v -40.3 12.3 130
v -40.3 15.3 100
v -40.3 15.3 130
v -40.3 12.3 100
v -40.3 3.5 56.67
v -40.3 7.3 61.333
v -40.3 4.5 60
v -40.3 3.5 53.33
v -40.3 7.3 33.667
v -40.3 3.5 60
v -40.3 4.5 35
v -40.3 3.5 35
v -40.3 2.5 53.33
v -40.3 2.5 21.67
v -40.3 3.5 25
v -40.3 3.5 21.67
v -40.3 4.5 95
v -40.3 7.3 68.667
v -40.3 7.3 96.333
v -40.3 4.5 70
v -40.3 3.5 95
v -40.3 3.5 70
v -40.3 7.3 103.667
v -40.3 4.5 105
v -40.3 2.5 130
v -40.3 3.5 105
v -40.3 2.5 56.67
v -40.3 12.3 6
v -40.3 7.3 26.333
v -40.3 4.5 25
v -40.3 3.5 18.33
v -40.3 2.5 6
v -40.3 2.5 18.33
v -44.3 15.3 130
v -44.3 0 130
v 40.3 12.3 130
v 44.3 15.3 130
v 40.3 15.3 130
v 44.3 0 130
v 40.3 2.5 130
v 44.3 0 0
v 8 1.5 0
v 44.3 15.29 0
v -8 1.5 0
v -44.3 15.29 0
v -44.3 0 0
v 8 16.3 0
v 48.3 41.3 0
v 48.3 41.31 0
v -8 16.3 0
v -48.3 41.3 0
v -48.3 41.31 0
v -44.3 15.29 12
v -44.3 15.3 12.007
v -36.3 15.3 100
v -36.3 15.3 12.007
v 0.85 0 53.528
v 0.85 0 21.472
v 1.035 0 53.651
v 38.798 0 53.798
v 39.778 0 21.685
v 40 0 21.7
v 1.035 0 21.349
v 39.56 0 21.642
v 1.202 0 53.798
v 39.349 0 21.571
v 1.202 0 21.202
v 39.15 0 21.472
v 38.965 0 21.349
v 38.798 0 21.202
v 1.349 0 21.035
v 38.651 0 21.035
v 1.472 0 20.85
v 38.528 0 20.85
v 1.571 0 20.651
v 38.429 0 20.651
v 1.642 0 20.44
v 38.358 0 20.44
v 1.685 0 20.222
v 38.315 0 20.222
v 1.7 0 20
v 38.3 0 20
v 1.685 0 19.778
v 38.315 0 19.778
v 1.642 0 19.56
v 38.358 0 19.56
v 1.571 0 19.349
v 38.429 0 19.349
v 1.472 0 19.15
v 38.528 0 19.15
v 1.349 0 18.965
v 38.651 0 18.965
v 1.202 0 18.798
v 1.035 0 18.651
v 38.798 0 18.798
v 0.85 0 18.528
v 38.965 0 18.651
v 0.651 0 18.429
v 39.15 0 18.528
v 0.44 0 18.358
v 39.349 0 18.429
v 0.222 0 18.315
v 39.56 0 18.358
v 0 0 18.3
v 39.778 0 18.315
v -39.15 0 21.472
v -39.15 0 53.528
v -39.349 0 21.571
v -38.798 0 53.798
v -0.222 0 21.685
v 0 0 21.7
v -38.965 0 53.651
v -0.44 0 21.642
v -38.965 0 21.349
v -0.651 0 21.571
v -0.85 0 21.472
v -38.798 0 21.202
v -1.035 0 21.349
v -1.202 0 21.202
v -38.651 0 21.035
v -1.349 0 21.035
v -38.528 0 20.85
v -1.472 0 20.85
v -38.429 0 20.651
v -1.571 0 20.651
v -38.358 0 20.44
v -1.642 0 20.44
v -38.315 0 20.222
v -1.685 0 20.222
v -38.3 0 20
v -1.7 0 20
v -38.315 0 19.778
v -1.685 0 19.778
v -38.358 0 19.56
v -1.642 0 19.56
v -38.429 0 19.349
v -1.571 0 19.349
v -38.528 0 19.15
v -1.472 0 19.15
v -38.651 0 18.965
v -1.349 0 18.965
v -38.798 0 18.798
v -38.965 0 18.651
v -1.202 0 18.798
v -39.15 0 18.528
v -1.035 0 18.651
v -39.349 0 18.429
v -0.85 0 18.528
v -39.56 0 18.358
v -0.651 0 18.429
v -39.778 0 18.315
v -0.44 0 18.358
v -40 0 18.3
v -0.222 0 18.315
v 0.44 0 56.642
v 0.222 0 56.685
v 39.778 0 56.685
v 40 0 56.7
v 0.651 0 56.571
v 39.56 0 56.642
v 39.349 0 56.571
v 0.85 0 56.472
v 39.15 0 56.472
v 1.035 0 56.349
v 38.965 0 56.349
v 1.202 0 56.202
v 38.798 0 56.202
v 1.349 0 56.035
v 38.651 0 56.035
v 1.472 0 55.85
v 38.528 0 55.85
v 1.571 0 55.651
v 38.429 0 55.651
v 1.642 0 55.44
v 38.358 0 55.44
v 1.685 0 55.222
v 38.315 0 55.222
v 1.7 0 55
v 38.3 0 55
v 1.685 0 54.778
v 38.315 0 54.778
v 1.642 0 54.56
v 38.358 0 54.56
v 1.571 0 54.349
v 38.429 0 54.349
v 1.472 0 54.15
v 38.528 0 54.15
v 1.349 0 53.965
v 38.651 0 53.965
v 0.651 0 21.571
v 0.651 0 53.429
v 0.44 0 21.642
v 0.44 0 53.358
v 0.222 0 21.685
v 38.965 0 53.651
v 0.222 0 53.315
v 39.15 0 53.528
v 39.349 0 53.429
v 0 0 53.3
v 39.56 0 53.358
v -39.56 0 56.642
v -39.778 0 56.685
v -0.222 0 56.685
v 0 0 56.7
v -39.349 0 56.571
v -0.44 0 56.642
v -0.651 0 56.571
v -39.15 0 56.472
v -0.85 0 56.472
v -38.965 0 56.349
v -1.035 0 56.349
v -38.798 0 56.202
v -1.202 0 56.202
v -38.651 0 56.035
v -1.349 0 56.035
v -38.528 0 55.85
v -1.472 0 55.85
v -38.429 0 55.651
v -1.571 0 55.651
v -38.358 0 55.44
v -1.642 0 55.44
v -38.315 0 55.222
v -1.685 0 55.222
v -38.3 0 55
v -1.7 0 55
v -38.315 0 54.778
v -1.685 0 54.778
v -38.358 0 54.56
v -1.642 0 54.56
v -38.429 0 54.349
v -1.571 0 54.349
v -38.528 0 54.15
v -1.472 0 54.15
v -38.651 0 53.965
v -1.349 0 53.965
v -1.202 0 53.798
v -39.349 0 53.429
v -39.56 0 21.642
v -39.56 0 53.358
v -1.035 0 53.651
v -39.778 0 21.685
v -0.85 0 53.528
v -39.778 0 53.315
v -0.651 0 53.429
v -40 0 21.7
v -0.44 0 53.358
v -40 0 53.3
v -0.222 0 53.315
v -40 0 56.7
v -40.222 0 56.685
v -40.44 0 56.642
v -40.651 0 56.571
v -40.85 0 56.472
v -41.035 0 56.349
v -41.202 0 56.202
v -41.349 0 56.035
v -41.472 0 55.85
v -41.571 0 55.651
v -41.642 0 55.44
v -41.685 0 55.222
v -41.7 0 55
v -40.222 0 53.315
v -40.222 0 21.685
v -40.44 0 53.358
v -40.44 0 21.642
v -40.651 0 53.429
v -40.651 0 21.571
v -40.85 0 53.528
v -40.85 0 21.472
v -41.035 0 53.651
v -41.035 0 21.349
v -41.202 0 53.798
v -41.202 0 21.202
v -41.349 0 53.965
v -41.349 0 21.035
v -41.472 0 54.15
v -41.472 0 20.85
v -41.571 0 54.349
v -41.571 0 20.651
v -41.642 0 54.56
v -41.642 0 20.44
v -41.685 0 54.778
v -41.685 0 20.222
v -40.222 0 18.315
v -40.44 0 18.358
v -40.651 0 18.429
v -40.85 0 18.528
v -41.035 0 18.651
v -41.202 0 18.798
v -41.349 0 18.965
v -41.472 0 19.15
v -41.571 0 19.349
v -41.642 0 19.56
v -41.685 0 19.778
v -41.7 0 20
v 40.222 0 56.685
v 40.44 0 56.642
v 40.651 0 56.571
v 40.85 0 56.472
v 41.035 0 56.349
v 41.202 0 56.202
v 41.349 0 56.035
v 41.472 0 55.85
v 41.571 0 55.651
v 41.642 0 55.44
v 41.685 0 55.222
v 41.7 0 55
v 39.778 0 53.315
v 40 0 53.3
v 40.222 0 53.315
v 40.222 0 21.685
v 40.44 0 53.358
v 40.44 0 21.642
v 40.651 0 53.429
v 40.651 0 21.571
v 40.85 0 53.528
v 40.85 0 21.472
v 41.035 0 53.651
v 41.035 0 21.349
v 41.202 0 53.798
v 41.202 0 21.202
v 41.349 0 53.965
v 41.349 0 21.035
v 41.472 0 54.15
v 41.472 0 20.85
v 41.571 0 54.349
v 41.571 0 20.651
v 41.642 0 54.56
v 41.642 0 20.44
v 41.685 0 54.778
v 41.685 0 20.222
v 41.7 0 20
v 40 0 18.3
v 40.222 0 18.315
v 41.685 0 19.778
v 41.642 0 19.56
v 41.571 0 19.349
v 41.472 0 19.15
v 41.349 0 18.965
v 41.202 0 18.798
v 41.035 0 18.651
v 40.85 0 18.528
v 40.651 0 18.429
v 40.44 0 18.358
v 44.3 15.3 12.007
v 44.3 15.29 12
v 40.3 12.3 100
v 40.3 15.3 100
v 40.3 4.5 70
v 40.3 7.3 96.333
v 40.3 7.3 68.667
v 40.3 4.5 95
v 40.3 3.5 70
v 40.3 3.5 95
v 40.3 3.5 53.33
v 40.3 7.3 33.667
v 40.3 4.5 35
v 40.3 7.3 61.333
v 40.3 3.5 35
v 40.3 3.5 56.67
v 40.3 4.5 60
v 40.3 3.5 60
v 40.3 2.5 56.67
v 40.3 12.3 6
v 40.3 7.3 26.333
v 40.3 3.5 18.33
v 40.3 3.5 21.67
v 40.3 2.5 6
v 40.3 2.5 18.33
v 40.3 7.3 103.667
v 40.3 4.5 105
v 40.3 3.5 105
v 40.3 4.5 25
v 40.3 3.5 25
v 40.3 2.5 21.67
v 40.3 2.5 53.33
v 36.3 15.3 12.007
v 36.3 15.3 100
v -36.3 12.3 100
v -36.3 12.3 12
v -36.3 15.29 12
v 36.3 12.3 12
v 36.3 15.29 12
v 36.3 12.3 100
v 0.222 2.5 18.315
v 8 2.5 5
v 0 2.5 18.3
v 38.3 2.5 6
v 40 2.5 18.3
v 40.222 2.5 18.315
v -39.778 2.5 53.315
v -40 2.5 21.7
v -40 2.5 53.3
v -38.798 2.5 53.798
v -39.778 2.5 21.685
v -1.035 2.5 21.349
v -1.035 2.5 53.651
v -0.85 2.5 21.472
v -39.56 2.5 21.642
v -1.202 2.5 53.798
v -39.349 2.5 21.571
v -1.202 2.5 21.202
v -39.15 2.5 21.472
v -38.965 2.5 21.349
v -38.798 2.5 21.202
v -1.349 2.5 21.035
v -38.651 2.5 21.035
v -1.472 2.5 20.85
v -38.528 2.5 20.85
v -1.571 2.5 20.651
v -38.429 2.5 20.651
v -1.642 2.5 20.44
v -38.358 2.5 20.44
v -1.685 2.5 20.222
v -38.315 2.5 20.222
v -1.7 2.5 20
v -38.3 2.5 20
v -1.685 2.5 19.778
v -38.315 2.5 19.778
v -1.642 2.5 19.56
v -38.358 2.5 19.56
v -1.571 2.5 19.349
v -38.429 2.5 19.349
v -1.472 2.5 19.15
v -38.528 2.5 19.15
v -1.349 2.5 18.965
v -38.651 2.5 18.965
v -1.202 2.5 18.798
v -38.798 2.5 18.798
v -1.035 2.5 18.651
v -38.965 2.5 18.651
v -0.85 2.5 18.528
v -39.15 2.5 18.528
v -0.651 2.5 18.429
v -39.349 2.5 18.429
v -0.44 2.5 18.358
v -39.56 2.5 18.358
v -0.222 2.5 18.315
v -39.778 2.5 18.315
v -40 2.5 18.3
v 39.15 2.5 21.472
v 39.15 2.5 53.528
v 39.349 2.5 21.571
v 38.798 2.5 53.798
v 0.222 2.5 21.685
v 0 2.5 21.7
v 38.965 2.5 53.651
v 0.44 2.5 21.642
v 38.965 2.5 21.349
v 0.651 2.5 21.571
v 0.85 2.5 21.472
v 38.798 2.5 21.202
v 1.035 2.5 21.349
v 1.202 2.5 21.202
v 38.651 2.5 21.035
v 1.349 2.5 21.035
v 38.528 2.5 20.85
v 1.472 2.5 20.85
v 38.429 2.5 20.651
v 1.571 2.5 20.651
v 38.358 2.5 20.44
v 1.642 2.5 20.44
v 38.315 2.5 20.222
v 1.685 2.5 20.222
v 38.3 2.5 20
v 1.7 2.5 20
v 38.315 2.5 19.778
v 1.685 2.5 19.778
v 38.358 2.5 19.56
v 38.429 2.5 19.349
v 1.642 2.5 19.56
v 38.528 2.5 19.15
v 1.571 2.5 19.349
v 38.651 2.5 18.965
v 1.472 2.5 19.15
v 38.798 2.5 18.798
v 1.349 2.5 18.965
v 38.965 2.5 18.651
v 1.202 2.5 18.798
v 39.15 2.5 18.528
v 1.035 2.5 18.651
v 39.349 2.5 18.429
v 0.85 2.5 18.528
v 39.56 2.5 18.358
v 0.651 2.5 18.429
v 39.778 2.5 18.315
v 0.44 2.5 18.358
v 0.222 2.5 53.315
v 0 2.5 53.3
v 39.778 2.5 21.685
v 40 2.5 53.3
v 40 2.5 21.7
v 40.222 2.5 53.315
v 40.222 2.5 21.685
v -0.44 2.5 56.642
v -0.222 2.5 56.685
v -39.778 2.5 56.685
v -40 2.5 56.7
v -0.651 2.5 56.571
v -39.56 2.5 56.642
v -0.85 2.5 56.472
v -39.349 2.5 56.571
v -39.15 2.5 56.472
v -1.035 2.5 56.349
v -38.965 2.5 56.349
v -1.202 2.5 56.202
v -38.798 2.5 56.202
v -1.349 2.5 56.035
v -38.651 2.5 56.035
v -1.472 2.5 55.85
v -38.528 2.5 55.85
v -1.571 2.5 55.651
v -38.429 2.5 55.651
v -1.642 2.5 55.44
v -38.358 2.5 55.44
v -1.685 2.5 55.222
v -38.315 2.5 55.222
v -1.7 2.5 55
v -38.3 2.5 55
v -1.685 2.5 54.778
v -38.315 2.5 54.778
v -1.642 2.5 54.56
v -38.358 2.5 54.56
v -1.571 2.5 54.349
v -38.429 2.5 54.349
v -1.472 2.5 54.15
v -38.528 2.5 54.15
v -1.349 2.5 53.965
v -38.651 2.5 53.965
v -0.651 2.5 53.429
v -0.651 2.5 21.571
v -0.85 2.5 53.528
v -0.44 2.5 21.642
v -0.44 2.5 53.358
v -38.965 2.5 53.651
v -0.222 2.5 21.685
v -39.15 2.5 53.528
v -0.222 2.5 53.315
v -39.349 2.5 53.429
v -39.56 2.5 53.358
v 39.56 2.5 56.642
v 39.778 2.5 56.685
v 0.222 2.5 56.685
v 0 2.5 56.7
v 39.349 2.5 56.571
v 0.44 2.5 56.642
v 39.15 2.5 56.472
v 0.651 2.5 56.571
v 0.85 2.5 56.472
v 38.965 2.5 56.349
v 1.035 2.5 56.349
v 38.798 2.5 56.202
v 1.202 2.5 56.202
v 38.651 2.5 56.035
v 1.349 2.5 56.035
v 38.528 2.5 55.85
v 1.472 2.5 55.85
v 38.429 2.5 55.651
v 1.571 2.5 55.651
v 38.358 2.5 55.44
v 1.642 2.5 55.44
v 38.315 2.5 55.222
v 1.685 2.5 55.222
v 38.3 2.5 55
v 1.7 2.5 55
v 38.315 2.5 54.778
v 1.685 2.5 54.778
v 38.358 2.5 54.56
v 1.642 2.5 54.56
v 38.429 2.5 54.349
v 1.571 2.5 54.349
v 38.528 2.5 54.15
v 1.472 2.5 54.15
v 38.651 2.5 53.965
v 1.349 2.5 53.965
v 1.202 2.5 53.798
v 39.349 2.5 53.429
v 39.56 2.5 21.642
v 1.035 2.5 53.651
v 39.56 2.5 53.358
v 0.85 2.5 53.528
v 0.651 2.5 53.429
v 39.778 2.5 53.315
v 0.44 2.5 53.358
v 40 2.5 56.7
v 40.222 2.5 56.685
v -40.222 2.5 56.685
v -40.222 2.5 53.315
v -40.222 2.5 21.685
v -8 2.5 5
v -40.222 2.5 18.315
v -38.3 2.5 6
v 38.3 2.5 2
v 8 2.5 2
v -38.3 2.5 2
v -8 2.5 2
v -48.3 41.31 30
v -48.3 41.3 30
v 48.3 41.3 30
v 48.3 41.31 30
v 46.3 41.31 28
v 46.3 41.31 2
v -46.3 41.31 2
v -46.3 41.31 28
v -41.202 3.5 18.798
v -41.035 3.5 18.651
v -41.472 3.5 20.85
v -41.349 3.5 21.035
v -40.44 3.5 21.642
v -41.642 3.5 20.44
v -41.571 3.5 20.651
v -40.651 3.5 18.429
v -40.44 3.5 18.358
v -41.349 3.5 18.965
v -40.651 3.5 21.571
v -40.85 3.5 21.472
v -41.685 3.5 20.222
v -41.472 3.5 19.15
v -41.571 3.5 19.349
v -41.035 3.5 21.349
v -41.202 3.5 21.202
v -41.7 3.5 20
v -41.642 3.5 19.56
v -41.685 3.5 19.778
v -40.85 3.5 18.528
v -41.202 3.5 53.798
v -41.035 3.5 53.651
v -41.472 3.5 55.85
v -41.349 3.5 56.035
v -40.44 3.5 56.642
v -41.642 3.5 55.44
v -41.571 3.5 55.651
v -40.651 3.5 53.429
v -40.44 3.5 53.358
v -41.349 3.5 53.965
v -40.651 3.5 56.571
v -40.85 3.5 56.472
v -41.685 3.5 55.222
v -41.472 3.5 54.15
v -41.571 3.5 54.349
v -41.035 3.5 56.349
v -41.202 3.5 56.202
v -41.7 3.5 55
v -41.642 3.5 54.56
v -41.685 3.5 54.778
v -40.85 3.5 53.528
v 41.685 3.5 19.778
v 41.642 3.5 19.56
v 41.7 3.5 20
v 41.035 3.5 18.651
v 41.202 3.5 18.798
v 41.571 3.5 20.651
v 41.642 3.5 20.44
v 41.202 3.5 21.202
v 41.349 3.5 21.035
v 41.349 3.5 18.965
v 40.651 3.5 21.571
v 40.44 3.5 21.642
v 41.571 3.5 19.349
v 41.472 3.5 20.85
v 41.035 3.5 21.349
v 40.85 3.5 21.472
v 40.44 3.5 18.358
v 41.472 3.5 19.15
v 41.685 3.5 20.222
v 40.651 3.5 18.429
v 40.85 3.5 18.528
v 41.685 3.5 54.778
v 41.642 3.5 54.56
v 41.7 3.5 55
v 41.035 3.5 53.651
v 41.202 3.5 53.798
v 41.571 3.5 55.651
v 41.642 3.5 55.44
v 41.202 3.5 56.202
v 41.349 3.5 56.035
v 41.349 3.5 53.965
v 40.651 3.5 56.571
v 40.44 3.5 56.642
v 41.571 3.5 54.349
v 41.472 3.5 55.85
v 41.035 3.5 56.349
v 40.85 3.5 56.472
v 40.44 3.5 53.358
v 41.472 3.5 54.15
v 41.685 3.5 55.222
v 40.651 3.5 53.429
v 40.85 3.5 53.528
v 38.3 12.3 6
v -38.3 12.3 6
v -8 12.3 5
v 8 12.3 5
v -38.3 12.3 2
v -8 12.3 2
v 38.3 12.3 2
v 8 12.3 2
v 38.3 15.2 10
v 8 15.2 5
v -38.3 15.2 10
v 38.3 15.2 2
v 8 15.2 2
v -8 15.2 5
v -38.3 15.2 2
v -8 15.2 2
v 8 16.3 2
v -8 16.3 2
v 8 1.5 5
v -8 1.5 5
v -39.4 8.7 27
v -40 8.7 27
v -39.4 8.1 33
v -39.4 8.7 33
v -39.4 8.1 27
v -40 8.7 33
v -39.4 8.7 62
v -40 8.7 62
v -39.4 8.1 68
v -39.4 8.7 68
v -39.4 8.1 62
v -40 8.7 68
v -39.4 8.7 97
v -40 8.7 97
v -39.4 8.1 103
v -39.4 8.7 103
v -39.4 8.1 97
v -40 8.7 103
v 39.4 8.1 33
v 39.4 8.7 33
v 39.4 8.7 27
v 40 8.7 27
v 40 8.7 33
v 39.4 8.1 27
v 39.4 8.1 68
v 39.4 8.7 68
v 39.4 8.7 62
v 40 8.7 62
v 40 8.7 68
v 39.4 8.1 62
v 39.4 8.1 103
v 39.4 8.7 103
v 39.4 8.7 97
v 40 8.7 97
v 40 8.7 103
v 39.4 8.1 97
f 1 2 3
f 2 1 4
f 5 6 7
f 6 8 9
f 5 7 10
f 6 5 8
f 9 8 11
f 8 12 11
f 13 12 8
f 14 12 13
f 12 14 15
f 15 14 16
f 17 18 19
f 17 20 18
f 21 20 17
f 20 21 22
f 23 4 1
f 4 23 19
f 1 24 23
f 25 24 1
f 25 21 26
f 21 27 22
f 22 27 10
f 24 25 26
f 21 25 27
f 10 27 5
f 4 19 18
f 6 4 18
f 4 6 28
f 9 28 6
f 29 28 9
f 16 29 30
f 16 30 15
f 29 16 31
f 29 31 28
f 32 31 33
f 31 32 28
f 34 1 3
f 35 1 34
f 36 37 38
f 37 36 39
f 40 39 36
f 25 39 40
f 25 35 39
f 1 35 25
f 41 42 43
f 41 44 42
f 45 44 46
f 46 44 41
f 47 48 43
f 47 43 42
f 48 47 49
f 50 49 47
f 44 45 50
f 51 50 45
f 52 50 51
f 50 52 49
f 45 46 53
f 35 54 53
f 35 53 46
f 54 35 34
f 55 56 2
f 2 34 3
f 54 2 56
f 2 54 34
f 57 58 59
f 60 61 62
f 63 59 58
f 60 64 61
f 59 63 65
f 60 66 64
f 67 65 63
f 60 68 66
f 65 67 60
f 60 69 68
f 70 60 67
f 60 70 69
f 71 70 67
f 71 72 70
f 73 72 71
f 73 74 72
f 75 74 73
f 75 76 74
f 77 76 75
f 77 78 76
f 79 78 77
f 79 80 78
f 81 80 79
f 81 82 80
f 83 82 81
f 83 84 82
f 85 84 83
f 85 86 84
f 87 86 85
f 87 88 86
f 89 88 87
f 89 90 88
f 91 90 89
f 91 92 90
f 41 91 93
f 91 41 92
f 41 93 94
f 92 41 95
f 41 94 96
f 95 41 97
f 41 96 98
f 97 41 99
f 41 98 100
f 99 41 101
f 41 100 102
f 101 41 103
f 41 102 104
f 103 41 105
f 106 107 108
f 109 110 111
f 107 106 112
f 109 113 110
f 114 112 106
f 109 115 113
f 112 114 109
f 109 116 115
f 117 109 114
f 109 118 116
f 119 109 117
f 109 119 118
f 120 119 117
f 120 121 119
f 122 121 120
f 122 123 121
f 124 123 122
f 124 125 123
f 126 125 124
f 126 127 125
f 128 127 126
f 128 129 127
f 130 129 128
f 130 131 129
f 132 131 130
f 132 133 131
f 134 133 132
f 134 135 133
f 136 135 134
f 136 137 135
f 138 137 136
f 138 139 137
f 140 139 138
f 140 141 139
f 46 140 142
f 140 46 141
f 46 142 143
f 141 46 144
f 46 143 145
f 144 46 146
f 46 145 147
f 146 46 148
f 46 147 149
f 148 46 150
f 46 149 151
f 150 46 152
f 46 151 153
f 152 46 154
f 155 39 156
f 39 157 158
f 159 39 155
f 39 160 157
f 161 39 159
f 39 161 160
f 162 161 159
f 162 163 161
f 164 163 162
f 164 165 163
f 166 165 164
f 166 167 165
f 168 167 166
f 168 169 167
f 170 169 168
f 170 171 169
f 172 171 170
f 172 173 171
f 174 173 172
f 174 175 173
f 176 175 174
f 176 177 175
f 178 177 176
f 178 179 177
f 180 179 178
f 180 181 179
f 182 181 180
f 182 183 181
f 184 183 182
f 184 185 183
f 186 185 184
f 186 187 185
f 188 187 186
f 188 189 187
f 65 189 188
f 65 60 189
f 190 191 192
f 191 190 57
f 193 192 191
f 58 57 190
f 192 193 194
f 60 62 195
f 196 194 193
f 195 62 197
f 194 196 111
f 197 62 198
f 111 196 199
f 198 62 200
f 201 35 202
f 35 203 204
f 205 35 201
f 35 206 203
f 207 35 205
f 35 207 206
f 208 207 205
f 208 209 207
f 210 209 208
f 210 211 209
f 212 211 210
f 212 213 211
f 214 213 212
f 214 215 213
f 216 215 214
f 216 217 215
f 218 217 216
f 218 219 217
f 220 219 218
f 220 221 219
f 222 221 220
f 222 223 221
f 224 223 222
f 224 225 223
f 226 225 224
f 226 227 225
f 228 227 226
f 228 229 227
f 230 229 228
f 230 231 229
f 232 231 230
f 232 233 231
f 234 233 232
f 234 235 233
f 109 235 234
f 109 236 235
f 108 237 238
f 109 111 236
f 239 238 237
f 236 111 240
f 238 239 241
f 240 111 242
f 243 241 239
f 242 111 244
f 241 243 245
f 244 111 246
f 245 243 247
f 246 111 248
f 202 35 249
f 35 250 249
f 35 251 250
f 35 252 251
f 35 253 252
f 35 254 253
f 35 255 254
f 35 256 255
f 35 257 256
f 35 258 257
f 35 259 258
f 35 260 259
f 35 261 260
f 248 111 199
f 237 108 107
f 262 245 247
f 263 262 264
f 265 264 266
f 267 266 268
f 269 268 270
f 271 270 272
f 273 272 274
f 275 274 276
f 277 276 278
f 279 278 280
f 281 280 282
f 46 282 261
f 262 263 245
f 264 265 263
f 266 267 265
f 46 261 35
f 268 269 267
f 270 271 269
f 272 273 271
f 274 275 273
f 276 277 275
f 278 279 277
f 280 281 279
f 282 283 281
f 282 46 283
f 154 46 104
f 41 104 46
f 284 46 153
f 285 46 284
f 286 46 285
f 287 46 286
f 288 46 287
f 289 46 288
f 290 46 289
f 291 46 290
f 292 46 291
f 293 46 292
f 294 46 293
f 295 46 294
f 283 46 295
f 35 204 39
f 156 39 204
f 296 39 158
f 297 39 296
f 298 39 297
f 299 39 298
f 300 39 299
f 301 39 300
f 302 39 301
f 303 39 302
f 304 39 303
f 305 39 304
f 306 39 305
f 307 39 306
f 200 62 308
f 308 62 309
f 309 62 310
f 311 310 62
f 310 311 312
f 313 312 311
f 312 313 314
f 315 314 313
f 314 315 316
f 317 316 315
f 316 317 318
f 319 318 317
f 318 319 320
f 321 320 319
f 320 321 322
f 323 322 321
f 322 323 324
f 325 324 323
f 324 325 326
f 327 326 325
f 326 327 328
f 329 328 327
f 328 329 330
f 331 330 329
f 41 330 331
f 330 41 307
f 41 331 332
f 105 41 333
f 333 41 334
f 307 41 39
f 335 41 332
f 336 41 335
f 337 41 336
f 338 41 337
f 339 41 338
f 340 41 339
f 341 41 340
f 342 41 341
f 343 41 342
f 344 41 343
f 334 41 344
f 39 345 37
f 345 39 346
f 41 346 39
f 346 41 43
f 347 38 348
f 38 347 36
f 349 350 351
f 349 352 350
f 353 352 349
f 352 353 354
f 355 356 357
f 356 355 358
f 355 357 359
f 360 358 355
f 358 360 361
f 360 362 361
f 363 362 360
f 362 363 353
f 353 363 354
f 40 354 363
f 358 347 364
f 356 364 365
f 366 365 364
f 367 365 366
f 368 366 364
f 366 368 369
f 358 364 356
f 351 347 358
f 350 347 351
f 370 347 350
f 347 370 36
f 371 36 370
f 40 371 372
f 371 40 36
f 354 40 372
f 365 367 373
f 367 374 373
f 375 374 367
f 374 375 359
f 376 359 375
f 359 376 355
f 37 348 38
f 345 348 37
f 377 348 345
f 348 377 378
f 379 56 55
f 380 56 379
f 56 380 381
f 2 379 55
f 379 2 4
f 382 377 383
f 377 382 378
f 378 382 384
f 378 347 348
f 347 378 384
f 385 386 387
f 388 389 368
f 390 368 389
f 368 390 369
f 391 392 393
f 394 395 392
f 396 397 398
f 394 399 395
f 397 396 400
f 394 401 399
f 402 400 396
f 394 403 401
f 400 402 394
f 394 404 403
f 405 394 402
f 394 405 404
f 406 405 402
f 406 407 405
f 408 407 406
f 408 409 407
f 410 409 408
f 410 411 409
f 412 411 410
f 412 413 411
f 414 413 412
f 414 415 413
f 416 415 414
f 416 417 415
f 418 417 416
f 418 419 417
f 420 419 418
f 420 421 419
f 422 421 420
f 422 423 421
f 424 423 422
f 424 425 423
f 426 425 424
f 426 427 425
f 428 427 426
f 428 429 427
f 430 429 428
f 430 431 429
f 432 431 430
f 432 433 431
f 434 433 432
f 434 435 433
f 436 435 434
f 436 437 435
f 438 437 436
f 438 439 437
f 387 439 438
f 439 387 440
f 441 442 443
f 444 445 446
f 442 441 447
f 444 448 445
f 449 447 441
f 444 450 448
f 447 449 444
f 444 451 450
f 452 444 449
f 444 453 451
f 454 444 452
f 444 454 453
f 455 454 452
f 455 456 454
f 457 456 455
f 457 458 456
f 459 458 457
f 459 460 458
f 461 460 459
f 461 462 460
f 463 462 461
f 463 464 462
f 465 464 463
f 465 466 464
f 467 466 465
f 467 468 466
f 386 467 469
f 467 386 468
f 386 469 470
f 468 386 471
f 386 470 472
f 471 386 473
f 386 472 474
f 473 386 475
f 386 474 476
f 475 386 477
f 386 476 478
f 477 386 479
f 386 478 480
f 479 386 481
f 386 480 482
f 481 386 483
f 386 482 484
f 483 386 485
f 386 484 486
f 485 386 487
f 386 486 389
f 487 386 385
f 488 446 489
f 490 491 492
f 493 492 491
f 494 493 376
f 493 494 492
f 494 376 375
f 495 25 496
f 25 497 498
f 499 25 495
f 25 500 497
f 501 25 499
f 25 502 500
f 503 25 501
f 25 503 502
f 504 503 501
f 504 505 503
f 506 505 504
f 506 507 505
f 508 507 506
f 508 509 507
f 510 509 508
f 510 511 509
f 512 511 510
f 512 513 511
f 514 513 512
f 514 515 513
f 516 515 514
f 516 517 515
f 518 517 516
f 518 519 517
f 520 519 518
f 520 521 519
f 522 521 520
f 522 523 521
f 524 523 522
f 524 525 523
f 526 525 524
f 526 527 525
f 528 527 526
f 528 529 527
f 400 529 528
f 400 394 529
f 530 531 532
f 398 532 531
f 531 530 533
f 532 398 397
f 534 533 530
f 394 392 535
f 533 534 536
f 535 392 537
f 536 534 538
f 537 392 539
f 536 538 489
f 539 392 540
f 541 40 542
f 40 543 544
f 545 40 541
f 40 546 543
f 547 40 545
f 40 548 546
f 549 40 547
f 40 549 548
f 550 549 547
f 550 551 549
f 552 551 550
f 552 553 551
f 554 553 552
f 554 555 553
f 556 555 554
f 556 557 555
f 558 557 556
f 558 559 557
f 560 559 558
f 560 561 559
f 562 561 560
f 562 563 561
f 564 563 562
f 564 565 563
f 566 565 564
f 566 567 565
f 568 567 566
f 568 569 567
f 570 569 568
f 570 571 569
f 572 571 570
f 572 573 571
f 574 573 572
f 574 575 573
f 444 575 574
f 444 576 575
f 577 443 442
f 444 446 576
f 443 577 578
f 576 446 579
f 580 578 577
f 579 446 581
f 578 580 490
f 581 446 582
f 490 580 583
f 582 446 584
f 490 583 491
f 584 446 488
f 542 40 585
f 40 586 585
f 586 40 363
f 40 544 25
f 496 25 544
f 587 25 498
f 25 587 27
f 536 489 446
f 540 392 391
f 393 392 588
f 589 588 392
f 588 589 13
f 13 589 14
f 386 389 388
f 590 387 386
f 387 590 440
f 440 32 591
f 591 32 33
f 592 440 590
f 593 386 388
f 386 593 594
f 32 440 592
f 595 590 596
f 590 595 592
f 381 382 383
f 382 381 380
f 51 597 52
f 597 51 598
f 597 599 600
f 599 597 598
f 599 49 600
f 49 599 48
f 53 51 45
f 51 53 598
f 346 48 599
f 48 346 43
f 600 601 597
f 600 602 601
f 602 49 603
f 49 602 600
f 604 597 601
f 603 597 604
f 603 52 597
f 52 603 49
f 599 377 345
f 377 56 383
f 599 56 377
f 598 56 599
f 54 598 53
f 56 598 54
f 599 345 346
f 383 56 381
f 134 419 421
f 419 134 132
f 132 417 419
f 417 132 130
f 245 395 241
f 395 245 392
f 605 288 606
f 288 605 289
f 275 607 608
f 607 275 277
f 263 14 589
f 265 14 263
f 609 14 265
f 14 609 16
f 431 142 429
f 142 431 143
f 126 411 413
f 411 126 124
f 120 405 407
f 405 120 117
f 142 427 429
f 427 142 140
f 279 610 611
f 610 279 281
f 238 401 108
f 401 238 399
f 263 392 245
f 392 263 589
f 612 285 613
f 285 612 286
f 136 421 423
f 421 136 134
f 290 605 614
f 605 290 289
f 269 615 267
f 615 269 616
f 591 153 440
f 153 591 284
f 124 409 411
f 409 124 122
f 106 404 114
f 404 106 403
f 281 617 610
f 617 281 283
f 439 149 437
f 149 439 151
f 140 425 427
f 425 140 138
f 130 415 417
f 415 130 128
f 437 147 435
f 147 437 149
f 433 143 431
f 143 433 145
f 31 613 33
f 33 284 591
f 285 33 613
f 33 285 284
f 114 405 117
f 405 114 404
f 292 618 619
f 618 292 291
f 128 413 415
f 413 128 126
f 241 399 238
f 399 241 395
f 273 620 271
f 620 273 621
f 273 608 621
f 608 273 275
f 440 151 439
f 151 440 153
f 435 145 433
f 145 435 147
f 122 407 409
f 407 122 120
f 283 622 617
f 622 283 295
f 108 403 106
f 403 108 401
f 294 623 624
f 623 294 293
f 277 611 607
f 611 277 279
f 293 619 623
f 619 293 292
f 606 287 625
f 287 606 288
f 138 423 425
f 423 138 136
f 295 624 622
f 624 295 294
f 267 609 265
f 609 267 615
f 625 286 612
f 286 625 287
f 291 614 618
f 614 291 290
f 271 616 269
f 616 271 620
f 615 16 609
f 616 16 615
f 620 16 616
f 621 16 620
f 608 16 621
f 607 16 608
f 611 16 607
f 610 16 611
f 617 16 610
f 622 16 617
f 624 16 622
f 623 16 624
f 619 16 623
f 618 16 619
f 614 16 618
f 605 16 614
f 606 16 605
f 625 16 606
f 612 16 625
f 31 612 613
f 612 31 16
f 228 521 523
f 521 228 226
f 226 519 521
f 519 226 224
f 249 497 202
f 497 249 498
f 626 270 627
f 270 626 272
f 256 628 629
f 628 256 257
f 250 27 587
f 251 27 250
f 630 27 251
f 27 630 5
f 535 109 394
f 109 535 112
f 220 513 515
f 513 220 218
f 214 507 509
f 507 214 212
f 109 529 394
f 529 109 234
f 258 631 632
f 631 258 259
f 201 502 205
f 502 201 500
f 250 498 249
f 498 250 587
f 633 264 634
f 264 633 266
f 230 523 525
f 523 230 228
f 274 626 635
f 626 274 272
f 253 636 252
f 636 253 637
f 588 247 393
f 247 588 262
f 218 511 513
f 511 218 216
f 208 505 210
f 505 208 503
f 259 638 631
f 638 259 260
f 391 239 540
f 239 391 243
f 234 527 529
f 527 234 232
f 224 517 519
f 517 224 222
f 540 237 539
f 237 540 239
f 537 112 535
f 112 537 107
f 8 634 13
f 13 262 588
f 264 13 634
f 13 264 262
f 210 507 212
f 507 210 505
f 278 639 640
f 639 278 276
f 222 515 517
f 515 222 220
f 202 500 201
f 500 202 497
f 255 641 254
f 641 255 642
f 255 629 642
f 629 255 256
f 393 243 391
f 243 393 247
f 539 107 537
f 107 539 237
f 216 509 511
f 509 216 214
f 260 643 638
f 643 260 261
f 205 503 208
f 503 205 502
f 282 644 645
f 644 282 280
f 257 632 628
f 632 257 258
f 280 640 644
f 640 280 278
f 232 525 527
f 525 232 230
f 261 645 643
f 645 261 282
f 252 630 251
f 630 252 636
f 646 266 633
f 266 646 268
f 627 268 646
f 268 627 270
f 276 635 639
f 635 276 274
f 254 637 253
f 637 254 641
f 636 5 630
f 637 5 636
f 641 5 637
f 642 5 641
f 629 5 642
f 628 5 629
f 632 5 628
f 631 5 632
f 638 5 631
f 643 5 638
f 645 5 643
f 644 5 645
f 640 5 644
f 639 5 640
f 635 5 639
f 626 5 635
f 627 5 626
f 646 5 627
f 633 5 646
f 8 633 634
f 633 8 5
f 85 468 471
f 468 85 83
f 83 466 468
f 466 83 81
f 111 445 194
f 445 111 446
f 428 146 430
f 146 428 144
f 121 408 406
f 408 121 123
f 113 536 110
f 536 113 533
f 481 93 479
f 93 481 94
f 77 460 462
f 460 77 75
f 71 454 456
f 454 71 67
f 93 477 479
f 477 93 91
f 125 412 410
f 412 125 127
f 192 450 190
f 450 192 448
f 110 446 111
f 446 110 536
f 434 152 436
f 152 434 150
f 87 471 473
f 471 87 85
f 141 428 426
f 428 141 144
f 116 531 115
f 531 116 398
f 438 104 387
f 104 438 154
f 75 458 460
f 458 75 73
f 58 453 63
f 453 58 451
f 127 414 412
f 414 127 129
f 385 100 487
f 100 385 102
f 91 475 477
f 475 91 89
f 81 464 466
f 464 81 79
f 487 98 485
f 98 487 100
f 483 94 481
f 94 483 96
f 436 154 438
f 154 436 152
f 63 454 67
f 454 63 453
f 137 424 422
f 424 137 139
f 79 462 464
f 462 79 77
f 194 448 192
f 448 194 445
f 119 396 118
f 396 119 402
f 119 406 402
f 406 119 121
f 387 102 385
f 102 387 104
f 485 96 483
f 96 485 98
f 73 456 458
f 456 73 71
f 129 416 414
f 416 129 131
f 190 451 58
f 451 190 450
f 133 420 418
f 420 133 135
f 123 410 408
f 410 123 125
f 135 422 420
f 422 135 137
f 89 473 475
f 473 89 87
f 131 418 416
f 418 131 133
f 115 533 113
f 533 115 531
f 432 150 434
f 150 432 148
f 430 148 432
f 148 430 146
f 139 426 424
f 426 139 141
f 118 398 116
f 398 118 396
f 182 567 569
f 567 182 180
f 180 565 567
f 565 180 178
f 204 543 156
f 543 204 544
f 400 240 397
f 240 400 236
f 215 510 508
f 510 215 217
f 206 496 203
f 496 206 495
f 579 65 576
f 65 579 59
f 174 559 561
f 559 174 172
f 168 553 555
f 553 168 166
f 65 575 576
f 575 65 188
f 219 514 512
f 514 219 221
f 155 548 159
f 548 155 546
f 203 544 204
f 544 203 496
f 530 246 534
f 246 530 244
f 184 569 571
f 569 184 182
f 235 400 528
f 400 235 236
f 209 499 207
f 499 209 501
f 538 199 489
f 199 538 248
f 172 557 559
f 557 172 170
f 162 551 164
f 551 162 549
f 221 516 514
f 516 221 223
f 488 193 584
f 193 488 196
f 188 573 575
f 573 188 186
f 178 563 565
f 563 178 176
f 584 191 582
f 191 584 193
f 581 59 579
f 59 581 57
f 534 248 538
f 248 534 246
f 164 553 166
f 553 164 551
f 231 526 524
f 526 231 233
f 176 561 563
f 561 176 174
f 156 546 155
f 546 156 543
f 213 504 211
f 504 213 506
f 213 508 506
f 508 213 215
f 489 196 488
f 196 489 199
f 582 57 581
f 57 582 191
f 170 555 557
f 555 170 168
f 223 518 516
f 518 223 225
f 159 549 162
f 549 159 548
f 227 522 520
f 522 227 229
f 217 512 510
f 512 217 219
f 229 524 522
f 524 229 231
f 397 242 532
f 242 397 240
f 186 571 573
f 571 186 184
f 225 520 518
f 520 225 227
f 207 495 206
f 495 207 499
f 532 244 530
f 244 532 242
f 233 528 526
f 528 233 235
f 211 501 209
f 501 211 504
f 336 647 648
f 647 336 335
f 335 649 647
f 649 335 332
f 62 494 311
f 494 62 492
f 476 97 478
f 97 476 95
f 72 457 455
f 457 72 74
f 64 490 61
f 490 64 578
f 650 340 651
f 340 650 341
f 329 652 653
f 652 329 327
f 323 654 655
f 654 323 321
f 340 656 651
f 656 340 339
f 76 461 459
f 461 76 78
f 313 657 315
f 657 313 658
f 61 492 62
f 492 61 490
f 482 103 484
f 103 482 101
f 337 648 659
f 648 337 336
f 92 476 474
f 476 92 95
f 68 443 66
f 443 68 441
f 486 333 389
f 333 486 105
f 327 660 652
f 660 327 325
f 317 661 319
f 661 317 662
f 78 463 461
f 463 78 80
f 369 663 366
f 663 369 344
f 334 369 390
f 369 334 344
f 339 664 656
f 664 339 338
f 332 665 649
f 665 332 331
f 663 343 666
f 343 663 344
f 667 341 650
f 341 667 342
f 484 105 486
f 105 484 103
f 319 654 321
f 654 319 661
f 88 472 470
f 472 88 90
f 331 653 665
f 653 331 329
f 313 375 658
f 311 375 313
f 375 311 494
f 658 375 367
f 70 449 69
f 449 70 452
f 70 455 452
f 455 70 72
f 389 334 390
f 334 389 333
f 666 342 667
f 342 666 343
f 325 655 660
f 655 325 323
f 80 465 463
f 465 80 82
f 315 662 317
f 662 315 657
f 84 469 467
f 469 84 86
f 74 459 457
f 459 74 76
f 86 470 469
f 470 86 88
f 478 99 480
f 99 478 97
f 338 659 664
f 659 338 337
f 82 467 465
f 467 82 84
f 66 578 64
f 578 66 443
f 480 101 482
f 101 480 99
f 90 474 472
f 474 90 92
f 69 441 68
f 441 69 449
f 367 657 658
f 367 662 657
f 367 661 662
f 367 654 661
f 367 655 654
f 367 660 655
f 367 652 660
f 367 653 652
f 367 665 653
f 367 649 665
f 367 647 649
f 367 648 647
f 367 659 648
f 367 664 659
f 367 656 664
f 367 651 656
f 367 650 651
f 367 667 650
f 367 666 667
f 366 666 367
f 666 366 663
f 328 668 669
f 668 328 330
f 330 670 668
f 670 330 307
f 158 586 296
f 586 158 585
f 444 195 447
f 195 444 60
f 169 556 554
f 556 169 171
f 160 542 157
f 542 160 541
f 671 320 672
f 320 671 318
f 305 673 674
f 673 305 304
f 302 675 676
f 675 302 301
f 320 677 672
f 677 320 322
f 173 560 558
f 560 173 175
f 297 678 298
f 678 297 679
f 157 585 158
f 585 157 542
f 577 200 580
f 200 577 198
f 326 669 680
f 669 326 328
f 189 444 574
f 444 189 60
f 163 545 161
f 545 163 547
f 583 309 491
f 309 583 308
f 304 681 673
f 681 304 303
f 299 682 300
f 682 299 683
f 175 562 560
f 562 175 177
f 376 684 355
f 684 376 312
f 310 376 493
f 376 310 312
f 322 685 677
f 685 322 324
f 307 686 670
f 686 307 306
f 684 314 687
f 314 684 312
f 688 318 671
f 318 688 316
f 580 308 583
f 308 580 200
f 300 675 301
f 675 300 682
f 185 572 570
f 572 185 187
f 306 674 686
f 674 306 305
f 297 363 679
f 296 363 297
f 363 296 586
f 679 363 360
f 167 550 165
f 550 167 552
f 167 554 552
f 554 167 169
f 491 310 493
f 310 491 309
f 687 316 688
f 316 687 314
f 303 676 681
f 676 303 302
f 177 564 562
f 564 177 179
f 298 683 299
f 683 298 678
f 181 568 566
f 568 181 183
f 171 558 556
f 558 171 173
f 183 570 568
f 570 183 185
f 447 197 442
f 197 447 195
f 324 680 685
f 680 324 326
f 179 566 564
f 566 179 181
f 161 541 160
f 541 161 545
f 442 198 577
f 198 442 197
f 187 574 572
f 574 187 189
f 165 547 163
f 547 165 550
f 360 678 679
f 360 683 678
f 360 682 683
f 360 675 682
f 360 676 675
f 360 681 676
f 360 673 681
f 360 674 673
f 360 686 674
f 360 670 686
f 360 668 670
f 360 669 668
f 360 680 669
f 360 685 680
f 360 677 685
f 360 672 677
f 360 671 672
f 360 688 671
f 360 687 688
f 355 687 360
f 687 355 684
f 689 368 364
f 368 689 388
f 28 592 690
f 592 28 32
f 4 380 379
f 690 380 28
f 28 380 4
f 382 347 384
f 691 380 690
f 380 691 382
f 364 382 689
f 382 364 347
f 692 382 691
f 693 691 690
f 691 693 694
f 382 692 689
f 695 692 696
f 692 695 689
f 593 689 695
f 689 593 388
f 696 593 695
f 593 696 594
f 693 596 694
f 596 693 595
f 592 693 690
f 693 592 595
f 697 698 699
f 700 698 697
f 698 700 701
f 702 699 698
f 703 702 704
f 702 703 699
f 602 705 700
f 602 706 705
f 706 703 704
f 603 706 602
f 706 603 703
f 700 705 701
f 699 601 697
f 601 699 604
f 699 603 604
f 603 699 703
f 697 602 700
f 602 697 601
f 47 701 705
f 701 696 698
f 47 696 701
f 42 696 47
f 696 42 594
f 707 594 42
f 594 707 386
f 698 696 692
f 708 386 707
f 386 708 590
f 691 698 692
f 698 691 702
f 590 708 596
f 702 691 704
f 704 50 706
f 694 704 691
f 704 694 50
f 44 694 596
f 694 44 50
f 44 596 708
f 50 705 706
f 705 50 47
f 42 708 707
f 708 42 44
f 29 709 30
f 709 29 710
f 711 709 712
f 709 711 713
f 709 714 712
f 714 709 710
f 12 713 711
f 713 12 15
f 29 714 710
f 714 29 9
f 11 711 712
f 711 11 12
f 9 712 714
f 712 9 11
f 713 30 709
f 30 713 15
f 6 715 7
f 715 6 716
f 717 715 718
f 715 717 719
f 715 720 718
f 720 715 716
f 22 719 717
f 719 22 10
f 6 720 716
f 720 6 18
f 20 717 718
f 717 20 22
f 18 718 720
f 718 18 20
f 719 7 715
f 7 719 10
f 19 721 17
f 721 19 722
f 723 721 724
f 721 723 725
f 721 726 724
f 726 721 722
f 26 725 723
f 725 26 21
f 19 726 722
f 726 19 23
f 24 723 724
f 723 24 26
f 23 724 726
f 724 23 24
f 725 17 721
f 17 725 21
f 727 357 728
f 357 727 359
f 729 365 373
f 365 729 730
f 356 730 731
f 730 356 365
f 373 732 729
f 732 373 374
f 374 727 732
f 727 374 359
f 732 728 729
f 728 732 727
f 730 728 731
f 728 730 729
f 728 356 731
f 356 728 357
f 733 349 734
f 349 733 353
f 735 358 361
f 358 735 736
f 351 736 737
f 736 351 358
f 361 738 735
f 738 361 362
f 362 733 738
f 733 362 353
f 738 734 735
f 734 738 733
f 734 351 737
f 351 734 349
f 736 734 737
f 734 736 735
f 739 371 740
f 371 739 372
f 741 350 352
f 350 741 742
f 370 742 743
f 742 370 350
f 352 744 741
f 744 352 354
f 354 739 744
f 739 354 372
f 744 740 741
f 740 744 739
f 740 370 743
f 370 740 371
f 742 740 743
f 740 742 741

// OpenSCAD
// file: params.scad
// Lanterna do Olho — parâmetros comuns (mm)
L = 150;      // comprimento externo (x)
W = 100;      // largura externa (y)
H = 80;       // altura externa (z)
wall = 2.0;   // parede
floor_t = 2.4;
rc = 5;       // raio dos cantos
dowel_d = 20.6;   // furo do cabo (dowel de 20 mm + folga). Cabo de vassoura: mede e troca.
socket_h = 35;    // altura do soquete do cabo dentro da caixa
lid_lip = 1.6;    // aba interna da tampa
lid_t = 3;
$fn = 64;
module rbox(l, w, h, r) { hull() for (x=[-1,1], y=[-1,1]) translate([x*(l/2-r), y*(w/2-r), 0]) cylinder(r=r, h=h); }
// main file
include <params.scad>
// BERÇO DO CELULAR v2 — com abas flexíveis e corneta acústica. (Segurança extra: um elástico em volta da caixa inteira.)
// Parafusa nos 6 furos da frente da caixa. Celular entra por cima; a borda de baixo entra na bolsa acústica.
// Imprime DEITADO: chapa de trás no prato (como o STL sai). Sem suporte.
ph_w = 80;   // largura do celular com case (mm)  <-- AJUSTE
ph_t = 9;    // espessura com case (mm)           <-- AJUSTE
rail_h = 130;        // altura dos trilhos (celular tem ~170; o topo fica livre)
lip = 4;             // aba frontal que segura a borda
lip_top = 100;       // abas só até essa altura (nada cobre a câmera lá em cima)
back_t = 2.5;        // chapa de trás
slot_w = ph_w + 0.6; // folga lateral
slot_t = ph_t + 0.8; // folga de espessura
rail = 4;            // espessura do trilho lateral
horn_depth = 26; horn_h_in = 12; horn_h_out = 30; pocket_h = 12;
y_front = back_t + slot_t;  // plano da frente do celular
$fn = 48;
module body() {
  // chapa de trás
  translate([-(slot_w+2*rail)/2, 0, 0]) cube([slot_w+2*rail, back_t, rail_h]);
  // trilhos laterais
  for (s=[-1,1]) translate([s*(slot_w/2+rail/2) - rail/2, 0, 0]) cube([rail, y_front+3, rail_h]);
  // abas frontais (com chanfro a 45° por baixo pra imprimir deitado)
  for (s=[-1,1]) hull() {
    translate([s>0 ? slot_w/2-lip : -slot_w/2, y_front, 0]) cube([lip, 3, lip_top]);
    translate([s>0 ? slot_w/2 : -slot_w/2-0.01, y_front-lip, 0]) cube([0.01, lip+3, lip_top]);
  }
  // bolsa acústica: caixa fechada em volta da borda de baixo do celular
  translate([-(slot_w+2*rail)/2, 0, 0]) cube([slot_w+2*rail, y_front+3, pocket_h]);
  // corneta: se abre pra frente (+y) a partir da bolsa
  hull() {
    translate([-(slot_w+2*rail)/2, y_front+3-0.01, 0]) cube([slot_w+2*rail, 0.01, horn_h_in]);
    translate([-(slot_w+2*rail)/2-4, y_front+3+horn_depth, 0]) cube([slot_w+2*rail+8, 0.01, horn_h_out]);
  }
}
module cavities() {
  // vão do celular
  translate([-slot_w/2, back_t, pocket_h-6]) cube([slot_w, slot_t, rail_h+10]);
  // câmara acústica dentro da bolsa (espaço embaixo do celular, 5 mm) e saída pra corneta
  translate([-slot_w/2+2, back_t, 2]) cube([slot_w-4, slot_t, pocket_h]);
  hull() {
    translate([-slot_w/2+2, y_front+2.9, 2]) cube([slot_w-4, 0.01, horn_h_in-4]);
    translate([-(slot_w+2*rail)/2-4+2, y_front+3+horn_depth+0.01, 2]) cube([slot_w+2*rail+8-4, 0.01, horn_h_out-4]);
  }
  // furos M3 (grade da caixa: x = -40,0,40 ; z = 20,55)
  for (x=[-40,0,40], z=[20,55]) translate([x, -1, z]) rotate([-90,0,0]) cylinder(d=3.4, h=back_t+2);
  // abertura na frente da bolsa pra porta USB (passa o cabo de carga por baixo)
  translate([-8, y_front-slot_t-1, -1]) cube([16, slot_t+5, 6]);
}
difference() { body(); cavities(); }
// abas flexíveis: lâminas de 0,8 mm nos trilhos, apertam as laterais do celular (1,2 mm de interferência)
for (s=[-1,1], z=[25, 60, 95]) translate([s*(slot_w/2) - (s>0?0:0.6) , back_t+1, z]) hull() {
  translate([0,0,0]) cube([0.6, 1, 10]);
  translate([s>0 ? -0.9 : 0.9, slot_t/2-0.3, 2]) cube([0.6, 0.6, 6]);
}
